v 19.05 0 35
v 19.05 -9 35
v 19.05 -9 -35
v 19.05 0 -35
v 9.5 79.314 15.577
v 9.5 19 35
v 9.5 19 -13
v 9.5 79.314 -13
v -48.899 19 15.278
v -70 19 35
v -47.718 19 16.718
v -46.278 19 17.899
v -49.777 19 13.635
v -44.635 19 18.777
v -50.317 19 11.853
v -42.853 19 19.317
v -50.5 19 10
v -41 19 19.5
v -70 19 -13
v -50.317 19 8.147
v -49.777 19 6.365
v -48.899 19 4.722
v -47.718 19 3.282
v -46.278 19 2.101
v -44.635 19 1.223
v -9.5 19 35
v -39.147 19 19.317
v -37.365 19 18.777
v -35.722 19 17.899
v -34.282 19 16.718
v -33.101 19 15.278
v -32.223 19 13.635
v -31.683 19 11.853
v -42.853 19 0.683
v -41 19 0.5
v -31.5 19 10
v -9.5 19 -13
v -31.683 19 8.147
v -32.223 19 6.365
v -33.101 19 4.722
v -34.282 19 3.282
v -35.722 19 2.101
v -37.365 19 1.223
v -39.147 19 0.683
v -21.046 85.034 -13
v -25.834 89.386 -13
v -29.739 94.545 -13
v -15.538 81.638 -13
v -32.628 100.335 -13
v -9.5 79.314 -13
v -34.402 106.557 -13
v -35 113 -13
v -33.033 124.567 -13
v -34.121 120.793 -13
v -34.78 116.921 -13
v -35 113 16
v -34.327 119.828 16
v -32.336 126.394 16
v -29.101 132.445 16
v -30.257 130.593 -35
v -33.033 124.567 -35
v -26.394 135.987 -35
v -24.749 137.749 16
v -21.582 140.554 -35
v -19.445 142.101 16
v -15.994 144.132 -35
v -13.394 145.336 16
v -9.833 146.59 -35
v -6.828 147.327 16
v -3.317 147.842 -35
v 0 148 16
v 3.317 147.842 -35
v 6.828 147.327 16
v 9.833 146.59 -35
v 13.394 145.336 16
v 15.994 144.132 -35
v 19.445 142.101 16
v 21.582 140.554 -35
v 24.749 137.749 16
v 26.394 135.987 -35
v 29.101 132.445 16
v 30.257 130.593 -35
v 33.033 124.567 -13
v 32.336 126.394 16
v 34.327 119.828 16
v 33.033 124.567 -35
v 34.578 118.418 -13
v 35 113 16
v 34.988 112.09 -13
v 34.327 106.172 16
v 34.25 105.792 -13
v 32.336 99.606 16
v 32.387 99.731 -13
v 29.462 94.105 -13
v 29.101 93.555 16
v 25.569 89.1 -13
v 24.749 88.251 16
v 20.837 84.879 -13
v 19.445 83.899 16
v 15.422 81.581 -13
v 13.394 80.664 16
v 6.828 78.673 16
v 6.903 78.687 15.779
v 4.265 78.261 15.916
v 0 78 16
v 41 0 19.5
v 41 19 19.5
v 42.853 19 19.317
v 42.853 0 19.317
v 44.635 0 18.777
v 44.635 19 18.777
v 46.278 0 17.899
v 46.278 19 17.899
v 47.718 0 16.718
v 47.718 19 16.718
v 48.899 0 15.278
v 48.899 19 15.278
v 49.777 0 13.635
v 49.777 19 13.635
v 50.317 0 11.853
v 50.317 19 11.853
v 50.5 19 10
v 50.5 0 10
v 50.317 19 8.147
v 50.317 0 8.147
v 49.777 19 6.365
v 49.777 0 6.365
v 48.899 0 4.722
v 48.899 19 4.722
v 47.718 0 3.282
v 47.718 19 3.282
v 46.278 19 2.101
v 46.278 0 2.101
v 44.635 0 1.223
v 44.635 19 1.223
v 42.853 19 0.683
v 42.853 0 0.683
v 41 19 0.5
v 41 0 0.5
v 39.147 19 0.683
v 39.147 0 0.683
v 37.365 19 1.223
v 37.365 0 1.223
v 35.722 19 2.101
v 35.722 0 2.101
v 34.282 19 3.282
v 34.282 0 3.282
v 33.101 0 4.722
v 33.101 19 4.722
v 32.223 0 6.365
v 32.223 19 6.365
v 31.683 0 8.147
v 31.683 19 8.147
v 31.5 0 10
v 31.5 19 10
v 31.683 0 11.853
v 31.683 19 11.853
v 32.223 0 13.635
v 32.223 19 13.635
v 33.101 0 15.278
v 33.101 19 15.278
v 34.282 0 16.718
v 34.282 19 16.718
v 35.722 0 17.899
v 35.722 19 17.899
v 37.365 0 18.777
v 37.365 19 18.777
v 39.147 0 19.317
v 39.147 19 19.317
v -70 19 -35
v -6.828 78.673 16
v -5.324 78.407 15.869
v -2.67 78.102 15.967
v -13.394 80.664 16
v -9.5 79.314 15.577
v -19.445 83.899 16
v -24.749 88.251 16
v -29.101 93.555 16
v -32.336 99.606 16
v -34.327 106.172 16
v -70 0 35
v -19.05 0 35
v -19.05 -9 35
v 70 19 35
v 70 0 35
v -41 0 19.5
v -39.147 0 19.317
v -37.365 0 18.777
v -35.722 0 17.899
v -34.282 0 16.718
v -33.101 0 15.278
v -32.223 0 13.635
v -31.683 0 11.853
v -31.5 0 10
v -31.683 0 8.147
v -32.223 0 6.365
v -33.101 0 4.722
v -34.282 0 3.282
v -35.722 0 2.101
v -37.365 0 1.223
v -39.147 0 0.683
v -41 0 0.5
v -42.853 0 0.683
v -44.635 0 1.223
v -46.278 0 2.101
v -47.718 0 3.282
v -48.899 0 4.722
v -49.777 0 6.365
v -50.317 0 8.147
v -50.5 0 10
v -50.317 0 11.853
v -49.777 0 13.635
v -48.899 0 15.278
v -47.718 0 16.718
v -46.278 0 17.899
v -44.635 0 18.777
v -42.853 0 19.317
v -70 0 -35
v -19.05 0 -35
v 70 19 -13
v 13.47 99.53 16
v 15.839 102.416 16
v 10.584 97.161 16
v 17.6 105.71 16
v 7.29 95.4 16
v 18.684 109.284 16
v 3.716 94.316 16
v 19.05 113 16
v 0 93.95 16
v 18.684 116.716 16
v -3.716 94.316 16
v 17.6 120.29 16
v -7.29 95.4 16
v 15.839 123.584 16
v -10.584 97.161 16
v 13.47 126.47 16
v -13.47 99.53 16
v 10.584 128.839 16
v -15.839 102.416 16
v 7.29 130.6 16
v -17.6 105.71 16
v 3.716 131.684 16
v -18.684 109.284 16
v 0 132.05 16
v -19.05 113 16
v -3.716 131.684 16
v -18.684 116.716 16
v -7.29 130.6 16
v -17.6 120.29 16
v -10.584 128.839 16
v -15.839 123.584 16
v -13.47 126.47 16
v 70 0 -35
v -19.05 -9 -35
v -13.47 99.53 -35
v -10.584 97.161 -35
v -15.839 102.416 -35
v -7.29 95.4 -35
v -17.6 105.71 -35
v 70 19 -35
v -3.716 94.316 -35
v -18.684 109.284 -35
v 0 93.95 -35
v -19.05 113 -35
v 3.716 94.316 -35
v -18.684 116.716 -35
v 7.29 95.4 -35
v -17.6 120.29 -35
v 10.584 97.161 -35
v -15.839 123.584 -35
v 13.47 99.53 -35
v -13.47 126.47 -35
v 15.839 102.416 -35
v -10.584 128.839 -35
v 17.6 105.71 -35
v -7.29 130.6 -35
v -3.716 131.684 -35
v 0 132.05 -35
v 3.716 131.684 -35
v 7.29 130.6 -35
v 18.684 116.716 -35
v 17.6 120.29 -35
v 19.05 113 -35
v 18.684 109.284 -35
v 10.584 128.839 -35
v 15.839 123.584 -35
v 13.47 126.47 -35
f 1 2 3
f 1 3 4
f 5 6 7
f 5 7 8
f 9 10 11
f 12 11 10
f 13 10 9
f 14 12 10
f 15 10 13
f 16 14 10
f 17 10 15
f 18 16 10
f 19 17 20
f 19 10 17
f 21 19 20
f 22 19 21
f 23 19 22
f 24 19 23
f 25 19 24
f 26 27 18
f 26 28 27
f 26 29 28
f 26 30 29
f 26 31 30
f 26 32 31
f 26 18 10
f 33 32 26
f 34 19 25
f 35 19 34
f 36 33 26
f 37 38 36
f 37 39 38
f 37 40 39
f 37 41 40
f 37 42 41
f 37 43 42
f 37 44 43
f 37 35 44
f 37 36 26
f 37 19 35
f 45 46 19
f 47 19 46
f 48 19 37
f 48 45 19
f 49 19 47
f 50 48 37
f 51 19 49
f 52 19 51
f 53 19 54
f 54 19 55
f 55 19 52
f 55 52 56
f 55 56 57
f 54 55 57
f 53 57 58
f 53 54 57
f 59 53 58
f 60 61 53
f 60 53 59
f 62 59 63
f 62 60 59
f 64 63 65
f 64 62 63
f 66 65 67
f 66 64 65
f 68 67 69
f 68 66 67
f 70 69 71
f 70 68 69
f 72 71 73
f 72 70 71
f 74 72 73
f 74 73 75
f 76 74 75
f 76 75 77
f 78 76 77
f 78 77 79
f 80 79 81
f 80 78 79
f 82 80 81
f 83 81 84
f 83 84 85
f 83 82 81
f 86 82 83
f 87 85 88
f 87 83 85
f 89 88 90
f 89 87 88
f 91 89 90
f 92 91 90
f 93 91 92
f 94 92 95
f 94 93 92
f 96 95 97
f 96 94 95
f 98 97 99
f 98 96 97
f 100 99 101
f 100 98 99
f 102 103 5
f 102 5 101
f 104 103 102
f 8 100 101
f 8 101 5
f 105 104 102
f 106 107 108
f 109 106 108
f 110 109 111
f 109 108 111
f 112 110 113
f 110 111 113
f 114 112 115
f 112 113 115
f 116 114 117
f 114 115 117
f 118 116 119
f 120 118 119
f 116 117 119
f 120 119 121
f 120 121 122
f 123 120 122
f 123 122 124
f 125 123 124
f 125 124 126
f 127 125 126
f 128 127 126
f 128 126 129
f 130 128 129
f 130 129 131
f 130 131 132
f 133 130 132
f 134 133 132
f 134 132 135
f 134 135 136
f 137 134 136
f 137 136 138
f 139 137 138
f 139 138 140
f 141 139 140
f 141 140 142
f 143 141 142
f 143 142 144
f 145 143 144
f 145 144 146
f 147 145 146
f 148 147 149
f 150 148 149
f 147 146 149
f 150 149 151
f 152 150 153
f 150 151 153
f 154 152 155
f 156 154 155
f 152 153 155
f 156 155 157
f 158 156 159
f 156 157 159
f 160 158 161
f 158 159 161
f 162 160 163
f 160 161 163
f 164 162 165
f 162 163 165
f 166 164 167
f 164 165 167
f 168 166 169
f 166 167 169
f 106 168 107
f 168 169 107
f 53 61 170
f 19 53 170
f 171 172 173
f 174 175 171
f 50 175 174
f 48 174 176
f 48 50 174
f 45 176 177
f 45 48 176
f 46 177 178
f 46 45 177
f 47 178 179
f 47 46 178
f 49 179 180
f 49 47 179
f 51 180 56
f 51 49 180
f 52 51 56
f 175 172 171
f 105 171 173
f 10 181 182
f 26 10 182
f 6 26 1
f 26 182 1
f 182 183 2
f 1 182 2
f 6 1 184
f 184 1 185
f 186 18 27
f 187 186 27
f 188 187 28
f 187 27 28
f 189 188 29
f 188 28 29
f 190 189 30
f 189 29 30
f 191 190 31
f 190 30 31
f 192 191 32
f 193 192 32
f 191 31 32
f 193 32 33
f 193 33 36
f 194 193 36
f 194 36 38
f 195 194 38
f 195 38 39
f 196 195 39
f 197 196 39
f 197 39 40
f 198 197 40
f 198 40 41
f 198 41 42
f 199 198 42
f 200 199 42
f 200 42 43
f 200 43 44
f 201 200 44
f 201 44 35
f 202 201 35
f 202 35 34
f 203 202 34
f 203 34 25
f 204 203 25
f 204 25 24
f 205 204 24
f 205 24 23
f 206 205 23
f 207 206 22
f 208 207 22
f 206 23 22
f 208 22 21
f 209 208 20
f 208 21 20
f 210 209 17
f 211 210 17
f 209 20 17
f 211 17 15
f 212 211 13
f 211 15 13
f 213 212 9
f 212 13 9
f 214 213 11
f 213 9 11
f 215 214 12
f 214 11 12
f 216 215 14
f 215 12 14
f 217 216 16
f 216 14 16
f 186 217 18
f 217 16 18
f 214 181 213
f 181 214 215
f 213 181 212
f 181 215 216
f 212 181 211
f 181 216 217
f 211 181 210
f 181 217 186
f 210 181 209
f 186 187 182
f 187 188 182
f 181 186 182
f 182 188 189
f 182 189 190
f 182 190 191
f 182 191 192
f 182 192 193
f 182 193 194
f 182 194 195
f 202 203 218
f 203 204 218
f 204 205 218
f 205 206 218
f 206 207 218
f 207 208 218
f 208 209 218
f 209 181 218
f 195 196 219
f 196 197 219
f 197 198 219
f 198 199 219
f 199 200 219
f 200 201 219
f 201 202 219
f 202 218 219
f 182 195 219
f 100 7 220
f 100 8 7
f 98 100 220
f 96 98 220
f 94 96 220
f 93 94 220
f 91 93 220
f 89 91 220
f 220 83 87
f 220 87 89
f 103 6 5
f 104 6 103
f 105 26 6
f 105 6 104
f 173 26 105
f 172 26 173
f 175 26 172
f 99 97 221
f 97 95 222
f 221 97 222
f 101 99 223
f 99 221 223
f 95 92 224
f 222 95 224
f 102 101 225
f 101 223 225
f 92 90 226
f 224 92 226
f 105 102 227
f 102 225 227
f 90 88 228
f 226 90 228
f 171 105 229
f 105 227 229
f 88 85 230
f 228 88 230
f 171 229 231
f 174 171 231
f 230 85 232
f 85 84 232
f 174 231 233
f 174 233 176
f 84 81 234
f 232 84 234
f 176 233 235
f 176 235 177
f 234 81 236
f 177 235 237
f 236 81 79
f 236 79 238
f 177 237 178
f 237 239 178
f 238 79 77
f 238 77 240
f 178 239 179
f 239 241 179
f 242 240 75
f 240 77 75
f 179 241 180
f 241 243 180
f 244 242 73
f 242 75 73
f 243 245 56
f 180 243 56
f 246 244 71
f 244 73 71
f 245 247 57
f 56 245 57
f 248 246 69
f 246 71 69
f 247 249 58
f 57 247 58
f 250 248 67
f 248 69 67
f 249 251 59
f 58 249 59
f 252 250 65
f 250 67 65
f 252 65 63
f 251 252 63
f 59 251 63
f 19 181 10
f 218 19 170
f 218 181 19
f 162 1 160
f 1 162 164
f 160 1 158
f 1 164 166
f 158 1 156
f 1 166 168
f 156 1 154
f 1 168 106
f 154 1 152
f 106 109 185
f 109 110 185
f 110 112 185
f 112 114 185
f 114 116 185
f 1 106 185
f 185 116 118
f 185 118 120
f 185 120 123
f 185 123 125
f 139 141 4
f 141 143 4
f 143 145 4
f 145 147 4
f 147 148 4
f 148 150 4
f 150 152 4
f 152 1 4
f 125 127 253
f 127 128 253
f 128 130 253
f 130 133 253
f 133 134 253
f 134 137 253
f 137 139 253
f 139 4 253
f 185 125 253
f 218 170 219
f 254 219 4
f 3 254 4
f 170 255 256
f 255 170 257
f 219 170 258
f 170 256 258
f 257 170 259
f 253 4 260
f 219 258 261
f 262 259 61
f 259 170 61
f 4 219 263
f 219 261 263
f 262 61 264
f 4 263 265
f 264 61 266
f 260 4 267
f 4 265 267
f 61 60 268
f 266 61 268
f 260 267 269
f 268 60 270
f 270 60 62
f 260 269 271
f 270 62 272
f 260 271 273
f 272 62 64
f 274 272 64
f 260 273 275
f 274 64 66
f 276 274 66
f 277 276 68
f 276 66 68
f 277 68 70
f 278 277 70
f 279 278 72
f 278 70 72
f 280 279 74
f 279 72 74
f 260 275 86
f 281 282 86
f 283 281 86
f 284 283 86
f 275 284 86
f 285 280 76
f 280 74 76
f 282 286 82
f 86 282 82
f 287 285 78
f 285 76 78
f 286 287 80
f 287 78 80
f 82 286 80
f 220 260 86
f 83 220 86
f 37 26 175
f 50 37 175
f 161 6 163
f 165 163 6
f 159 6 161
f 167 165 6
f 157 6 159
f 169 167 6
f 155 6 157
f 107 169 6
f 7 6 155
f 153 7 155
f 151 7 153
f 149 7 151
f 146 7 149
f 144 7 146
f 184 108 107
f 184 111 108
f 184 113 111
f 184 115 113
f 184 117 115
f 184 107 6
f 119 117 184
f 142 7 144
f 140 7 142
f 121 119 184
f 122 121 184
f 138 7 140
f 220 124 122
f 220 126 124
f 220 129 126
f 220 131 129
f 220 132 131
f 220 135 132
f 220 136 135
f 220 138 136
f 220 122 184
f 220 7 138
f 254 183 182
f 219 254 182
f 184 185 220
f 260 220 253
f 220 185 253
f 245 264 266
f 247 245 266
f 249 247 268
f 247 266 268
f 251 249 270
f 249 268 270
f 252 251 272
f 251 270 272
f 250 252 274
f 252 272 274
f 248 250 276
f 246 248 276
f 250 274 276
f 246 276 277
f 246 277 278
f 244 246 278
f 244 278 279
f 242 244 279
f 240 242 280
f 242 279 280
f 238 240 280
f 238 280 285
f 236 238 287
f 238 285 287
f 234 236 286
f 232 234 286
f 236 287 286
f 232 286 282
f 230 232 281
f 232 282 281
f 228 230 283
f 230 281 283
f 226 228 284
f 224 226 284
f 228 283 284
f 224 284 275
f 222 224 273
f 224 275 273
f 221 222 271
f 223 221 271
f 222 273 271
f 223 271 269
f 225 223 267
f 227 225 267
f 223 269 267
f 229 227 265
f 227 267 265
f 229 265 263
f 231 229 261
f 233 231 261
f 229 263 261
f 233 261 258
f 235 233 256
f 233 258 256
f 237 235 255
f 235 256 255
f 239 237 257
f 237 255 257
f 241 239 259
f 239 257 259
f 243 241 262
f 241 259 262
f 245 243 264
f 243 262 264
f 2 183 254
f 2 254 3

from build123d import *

# Parameters (mm, degrees)
SKETCH1_W           = 140
SKETCH1_H           = 70
BOSS_EXTRUDE1_DEPTH = 19
SKETCH2_W           = 38.1
SKETCH2_H           = 9
BOSS_EXTRUDE2_DEPTH = 70
SKETCH3_R           = 9.5
CUT_EXTRUDE1_DEPTH  = 84.120394609
SKETCH4_R           = 35
SKETCH4_R_2         = 19.05
BOSS_EXTRUDE3_DEPTH = 51
BOSS_EXTRUDE4_DEPTH = 22
RIB5_REACH          = 169.419
SKETCH10_WALL_W     = 398.82114278
SKETCH10_WALL_H     = 19


with BuildPart() as part:
    # Sketch1 → Boss-Extrude1 (new body)
    with BuildSketch(Plane(origin=(0, 0, 0), x_dir=(1, 0, 0), z_dir=(0, 1, 0))):
        Rectangle(SKETCH1_W, SKETCH1_H)
    extrude(amount=BOSS_EXTRUDE1_DEPTH)

    # Sketch2 → Boss-Extrude2 (add)
    with BuildSketch(Plane.XY.offset(35)):
        with Locations((0, -4.5)):
            Rectangle(SKETCH2_W, SKETCH2_H)
    extrude(amount=-BOSS_EXTRUDE2_DEPTH)

    # Sketch3 → Cut-Extrude1 (cut, through all)
    with BuildSketch(Plane(origin=(0, 19, 0), x_dir=(1, 0, 0), z_dir=(0, 1, 0))):
        with Locations(Location((41, -10, 0), (0, 0, 270))):
            Circle(SKETCH3_R)
        with Locations(Location((-41, -10, 0), (0, 0, 270))):
            Circle(SKETCH3_R)
    extrude(amount=-CUT_EXTRUDE1_DEPTH, mode=Mode.SUBTRACT)



with BuildPart() as body_2:
    # Sketch4 → Boss-Extrude3 (new body)
    with BuildSketch(Plane(origin=(0, 0, -35), x_dir=(-1, 0, 0), z_dir=(0, 0, -1))):
        with Locations((0, 113)):
            Circle(SKETCH4_R)
        with Locations((0, 113)):
            Circle(SKETCH4_R_2, mode=Mode.SUBTRACT)
    extrude(amount=-BOSS_EXTRUDE3_DEPTH)


with BuildPart() as part_1:
    add(part.part)

    add(body_2.part)  # Boss-Extrude4 merges body 2
    # Sketch7 → Boss-Extrude4 (add)
    with BuildSketch(Plane(origin=(0, 0, -35), x_dir=(-1, 0, 0), z_dir=(0, 0, -1))):
        with BuildLine():
            Line((-70, 19), (-33.033269752, 124.567328538))
            ThreePointArc((-33.033269752, 124.567328538), (0, 78), (33.033269752, 124.567328538))
            Line((33.033269752, 124.567328538), (70, 19))
            Line((70, 19), (-70, 19))
        make_face()
    extrude(amount=-BOSS_EXTRUDE4_DEPTH)

    # Sketch10 wall → Rib5 (add, up to next)
    with BuildSketch(Plane(origin=(0, 48.5, 25.5), x_dir=(0, 0.951860557857, -0.306531366089), z_dir=(0, 0.306531366089, 0.951860557857)), mode=Mode.PRIVATE) as rib5_sk1:
        Rectangle(SKETCH10_WALL_W, SKETCH10_WALL_H)
    rib5_tool1 = extrude(rib5_sk1.sketch, amount=-RIB5_REACH, mode=Mode.PRIVATE) - part_1.part
    add(rib5_tool1.solids().sort_by_distance((0, 48.5, 25.5))[0])


solid = part_1.part
